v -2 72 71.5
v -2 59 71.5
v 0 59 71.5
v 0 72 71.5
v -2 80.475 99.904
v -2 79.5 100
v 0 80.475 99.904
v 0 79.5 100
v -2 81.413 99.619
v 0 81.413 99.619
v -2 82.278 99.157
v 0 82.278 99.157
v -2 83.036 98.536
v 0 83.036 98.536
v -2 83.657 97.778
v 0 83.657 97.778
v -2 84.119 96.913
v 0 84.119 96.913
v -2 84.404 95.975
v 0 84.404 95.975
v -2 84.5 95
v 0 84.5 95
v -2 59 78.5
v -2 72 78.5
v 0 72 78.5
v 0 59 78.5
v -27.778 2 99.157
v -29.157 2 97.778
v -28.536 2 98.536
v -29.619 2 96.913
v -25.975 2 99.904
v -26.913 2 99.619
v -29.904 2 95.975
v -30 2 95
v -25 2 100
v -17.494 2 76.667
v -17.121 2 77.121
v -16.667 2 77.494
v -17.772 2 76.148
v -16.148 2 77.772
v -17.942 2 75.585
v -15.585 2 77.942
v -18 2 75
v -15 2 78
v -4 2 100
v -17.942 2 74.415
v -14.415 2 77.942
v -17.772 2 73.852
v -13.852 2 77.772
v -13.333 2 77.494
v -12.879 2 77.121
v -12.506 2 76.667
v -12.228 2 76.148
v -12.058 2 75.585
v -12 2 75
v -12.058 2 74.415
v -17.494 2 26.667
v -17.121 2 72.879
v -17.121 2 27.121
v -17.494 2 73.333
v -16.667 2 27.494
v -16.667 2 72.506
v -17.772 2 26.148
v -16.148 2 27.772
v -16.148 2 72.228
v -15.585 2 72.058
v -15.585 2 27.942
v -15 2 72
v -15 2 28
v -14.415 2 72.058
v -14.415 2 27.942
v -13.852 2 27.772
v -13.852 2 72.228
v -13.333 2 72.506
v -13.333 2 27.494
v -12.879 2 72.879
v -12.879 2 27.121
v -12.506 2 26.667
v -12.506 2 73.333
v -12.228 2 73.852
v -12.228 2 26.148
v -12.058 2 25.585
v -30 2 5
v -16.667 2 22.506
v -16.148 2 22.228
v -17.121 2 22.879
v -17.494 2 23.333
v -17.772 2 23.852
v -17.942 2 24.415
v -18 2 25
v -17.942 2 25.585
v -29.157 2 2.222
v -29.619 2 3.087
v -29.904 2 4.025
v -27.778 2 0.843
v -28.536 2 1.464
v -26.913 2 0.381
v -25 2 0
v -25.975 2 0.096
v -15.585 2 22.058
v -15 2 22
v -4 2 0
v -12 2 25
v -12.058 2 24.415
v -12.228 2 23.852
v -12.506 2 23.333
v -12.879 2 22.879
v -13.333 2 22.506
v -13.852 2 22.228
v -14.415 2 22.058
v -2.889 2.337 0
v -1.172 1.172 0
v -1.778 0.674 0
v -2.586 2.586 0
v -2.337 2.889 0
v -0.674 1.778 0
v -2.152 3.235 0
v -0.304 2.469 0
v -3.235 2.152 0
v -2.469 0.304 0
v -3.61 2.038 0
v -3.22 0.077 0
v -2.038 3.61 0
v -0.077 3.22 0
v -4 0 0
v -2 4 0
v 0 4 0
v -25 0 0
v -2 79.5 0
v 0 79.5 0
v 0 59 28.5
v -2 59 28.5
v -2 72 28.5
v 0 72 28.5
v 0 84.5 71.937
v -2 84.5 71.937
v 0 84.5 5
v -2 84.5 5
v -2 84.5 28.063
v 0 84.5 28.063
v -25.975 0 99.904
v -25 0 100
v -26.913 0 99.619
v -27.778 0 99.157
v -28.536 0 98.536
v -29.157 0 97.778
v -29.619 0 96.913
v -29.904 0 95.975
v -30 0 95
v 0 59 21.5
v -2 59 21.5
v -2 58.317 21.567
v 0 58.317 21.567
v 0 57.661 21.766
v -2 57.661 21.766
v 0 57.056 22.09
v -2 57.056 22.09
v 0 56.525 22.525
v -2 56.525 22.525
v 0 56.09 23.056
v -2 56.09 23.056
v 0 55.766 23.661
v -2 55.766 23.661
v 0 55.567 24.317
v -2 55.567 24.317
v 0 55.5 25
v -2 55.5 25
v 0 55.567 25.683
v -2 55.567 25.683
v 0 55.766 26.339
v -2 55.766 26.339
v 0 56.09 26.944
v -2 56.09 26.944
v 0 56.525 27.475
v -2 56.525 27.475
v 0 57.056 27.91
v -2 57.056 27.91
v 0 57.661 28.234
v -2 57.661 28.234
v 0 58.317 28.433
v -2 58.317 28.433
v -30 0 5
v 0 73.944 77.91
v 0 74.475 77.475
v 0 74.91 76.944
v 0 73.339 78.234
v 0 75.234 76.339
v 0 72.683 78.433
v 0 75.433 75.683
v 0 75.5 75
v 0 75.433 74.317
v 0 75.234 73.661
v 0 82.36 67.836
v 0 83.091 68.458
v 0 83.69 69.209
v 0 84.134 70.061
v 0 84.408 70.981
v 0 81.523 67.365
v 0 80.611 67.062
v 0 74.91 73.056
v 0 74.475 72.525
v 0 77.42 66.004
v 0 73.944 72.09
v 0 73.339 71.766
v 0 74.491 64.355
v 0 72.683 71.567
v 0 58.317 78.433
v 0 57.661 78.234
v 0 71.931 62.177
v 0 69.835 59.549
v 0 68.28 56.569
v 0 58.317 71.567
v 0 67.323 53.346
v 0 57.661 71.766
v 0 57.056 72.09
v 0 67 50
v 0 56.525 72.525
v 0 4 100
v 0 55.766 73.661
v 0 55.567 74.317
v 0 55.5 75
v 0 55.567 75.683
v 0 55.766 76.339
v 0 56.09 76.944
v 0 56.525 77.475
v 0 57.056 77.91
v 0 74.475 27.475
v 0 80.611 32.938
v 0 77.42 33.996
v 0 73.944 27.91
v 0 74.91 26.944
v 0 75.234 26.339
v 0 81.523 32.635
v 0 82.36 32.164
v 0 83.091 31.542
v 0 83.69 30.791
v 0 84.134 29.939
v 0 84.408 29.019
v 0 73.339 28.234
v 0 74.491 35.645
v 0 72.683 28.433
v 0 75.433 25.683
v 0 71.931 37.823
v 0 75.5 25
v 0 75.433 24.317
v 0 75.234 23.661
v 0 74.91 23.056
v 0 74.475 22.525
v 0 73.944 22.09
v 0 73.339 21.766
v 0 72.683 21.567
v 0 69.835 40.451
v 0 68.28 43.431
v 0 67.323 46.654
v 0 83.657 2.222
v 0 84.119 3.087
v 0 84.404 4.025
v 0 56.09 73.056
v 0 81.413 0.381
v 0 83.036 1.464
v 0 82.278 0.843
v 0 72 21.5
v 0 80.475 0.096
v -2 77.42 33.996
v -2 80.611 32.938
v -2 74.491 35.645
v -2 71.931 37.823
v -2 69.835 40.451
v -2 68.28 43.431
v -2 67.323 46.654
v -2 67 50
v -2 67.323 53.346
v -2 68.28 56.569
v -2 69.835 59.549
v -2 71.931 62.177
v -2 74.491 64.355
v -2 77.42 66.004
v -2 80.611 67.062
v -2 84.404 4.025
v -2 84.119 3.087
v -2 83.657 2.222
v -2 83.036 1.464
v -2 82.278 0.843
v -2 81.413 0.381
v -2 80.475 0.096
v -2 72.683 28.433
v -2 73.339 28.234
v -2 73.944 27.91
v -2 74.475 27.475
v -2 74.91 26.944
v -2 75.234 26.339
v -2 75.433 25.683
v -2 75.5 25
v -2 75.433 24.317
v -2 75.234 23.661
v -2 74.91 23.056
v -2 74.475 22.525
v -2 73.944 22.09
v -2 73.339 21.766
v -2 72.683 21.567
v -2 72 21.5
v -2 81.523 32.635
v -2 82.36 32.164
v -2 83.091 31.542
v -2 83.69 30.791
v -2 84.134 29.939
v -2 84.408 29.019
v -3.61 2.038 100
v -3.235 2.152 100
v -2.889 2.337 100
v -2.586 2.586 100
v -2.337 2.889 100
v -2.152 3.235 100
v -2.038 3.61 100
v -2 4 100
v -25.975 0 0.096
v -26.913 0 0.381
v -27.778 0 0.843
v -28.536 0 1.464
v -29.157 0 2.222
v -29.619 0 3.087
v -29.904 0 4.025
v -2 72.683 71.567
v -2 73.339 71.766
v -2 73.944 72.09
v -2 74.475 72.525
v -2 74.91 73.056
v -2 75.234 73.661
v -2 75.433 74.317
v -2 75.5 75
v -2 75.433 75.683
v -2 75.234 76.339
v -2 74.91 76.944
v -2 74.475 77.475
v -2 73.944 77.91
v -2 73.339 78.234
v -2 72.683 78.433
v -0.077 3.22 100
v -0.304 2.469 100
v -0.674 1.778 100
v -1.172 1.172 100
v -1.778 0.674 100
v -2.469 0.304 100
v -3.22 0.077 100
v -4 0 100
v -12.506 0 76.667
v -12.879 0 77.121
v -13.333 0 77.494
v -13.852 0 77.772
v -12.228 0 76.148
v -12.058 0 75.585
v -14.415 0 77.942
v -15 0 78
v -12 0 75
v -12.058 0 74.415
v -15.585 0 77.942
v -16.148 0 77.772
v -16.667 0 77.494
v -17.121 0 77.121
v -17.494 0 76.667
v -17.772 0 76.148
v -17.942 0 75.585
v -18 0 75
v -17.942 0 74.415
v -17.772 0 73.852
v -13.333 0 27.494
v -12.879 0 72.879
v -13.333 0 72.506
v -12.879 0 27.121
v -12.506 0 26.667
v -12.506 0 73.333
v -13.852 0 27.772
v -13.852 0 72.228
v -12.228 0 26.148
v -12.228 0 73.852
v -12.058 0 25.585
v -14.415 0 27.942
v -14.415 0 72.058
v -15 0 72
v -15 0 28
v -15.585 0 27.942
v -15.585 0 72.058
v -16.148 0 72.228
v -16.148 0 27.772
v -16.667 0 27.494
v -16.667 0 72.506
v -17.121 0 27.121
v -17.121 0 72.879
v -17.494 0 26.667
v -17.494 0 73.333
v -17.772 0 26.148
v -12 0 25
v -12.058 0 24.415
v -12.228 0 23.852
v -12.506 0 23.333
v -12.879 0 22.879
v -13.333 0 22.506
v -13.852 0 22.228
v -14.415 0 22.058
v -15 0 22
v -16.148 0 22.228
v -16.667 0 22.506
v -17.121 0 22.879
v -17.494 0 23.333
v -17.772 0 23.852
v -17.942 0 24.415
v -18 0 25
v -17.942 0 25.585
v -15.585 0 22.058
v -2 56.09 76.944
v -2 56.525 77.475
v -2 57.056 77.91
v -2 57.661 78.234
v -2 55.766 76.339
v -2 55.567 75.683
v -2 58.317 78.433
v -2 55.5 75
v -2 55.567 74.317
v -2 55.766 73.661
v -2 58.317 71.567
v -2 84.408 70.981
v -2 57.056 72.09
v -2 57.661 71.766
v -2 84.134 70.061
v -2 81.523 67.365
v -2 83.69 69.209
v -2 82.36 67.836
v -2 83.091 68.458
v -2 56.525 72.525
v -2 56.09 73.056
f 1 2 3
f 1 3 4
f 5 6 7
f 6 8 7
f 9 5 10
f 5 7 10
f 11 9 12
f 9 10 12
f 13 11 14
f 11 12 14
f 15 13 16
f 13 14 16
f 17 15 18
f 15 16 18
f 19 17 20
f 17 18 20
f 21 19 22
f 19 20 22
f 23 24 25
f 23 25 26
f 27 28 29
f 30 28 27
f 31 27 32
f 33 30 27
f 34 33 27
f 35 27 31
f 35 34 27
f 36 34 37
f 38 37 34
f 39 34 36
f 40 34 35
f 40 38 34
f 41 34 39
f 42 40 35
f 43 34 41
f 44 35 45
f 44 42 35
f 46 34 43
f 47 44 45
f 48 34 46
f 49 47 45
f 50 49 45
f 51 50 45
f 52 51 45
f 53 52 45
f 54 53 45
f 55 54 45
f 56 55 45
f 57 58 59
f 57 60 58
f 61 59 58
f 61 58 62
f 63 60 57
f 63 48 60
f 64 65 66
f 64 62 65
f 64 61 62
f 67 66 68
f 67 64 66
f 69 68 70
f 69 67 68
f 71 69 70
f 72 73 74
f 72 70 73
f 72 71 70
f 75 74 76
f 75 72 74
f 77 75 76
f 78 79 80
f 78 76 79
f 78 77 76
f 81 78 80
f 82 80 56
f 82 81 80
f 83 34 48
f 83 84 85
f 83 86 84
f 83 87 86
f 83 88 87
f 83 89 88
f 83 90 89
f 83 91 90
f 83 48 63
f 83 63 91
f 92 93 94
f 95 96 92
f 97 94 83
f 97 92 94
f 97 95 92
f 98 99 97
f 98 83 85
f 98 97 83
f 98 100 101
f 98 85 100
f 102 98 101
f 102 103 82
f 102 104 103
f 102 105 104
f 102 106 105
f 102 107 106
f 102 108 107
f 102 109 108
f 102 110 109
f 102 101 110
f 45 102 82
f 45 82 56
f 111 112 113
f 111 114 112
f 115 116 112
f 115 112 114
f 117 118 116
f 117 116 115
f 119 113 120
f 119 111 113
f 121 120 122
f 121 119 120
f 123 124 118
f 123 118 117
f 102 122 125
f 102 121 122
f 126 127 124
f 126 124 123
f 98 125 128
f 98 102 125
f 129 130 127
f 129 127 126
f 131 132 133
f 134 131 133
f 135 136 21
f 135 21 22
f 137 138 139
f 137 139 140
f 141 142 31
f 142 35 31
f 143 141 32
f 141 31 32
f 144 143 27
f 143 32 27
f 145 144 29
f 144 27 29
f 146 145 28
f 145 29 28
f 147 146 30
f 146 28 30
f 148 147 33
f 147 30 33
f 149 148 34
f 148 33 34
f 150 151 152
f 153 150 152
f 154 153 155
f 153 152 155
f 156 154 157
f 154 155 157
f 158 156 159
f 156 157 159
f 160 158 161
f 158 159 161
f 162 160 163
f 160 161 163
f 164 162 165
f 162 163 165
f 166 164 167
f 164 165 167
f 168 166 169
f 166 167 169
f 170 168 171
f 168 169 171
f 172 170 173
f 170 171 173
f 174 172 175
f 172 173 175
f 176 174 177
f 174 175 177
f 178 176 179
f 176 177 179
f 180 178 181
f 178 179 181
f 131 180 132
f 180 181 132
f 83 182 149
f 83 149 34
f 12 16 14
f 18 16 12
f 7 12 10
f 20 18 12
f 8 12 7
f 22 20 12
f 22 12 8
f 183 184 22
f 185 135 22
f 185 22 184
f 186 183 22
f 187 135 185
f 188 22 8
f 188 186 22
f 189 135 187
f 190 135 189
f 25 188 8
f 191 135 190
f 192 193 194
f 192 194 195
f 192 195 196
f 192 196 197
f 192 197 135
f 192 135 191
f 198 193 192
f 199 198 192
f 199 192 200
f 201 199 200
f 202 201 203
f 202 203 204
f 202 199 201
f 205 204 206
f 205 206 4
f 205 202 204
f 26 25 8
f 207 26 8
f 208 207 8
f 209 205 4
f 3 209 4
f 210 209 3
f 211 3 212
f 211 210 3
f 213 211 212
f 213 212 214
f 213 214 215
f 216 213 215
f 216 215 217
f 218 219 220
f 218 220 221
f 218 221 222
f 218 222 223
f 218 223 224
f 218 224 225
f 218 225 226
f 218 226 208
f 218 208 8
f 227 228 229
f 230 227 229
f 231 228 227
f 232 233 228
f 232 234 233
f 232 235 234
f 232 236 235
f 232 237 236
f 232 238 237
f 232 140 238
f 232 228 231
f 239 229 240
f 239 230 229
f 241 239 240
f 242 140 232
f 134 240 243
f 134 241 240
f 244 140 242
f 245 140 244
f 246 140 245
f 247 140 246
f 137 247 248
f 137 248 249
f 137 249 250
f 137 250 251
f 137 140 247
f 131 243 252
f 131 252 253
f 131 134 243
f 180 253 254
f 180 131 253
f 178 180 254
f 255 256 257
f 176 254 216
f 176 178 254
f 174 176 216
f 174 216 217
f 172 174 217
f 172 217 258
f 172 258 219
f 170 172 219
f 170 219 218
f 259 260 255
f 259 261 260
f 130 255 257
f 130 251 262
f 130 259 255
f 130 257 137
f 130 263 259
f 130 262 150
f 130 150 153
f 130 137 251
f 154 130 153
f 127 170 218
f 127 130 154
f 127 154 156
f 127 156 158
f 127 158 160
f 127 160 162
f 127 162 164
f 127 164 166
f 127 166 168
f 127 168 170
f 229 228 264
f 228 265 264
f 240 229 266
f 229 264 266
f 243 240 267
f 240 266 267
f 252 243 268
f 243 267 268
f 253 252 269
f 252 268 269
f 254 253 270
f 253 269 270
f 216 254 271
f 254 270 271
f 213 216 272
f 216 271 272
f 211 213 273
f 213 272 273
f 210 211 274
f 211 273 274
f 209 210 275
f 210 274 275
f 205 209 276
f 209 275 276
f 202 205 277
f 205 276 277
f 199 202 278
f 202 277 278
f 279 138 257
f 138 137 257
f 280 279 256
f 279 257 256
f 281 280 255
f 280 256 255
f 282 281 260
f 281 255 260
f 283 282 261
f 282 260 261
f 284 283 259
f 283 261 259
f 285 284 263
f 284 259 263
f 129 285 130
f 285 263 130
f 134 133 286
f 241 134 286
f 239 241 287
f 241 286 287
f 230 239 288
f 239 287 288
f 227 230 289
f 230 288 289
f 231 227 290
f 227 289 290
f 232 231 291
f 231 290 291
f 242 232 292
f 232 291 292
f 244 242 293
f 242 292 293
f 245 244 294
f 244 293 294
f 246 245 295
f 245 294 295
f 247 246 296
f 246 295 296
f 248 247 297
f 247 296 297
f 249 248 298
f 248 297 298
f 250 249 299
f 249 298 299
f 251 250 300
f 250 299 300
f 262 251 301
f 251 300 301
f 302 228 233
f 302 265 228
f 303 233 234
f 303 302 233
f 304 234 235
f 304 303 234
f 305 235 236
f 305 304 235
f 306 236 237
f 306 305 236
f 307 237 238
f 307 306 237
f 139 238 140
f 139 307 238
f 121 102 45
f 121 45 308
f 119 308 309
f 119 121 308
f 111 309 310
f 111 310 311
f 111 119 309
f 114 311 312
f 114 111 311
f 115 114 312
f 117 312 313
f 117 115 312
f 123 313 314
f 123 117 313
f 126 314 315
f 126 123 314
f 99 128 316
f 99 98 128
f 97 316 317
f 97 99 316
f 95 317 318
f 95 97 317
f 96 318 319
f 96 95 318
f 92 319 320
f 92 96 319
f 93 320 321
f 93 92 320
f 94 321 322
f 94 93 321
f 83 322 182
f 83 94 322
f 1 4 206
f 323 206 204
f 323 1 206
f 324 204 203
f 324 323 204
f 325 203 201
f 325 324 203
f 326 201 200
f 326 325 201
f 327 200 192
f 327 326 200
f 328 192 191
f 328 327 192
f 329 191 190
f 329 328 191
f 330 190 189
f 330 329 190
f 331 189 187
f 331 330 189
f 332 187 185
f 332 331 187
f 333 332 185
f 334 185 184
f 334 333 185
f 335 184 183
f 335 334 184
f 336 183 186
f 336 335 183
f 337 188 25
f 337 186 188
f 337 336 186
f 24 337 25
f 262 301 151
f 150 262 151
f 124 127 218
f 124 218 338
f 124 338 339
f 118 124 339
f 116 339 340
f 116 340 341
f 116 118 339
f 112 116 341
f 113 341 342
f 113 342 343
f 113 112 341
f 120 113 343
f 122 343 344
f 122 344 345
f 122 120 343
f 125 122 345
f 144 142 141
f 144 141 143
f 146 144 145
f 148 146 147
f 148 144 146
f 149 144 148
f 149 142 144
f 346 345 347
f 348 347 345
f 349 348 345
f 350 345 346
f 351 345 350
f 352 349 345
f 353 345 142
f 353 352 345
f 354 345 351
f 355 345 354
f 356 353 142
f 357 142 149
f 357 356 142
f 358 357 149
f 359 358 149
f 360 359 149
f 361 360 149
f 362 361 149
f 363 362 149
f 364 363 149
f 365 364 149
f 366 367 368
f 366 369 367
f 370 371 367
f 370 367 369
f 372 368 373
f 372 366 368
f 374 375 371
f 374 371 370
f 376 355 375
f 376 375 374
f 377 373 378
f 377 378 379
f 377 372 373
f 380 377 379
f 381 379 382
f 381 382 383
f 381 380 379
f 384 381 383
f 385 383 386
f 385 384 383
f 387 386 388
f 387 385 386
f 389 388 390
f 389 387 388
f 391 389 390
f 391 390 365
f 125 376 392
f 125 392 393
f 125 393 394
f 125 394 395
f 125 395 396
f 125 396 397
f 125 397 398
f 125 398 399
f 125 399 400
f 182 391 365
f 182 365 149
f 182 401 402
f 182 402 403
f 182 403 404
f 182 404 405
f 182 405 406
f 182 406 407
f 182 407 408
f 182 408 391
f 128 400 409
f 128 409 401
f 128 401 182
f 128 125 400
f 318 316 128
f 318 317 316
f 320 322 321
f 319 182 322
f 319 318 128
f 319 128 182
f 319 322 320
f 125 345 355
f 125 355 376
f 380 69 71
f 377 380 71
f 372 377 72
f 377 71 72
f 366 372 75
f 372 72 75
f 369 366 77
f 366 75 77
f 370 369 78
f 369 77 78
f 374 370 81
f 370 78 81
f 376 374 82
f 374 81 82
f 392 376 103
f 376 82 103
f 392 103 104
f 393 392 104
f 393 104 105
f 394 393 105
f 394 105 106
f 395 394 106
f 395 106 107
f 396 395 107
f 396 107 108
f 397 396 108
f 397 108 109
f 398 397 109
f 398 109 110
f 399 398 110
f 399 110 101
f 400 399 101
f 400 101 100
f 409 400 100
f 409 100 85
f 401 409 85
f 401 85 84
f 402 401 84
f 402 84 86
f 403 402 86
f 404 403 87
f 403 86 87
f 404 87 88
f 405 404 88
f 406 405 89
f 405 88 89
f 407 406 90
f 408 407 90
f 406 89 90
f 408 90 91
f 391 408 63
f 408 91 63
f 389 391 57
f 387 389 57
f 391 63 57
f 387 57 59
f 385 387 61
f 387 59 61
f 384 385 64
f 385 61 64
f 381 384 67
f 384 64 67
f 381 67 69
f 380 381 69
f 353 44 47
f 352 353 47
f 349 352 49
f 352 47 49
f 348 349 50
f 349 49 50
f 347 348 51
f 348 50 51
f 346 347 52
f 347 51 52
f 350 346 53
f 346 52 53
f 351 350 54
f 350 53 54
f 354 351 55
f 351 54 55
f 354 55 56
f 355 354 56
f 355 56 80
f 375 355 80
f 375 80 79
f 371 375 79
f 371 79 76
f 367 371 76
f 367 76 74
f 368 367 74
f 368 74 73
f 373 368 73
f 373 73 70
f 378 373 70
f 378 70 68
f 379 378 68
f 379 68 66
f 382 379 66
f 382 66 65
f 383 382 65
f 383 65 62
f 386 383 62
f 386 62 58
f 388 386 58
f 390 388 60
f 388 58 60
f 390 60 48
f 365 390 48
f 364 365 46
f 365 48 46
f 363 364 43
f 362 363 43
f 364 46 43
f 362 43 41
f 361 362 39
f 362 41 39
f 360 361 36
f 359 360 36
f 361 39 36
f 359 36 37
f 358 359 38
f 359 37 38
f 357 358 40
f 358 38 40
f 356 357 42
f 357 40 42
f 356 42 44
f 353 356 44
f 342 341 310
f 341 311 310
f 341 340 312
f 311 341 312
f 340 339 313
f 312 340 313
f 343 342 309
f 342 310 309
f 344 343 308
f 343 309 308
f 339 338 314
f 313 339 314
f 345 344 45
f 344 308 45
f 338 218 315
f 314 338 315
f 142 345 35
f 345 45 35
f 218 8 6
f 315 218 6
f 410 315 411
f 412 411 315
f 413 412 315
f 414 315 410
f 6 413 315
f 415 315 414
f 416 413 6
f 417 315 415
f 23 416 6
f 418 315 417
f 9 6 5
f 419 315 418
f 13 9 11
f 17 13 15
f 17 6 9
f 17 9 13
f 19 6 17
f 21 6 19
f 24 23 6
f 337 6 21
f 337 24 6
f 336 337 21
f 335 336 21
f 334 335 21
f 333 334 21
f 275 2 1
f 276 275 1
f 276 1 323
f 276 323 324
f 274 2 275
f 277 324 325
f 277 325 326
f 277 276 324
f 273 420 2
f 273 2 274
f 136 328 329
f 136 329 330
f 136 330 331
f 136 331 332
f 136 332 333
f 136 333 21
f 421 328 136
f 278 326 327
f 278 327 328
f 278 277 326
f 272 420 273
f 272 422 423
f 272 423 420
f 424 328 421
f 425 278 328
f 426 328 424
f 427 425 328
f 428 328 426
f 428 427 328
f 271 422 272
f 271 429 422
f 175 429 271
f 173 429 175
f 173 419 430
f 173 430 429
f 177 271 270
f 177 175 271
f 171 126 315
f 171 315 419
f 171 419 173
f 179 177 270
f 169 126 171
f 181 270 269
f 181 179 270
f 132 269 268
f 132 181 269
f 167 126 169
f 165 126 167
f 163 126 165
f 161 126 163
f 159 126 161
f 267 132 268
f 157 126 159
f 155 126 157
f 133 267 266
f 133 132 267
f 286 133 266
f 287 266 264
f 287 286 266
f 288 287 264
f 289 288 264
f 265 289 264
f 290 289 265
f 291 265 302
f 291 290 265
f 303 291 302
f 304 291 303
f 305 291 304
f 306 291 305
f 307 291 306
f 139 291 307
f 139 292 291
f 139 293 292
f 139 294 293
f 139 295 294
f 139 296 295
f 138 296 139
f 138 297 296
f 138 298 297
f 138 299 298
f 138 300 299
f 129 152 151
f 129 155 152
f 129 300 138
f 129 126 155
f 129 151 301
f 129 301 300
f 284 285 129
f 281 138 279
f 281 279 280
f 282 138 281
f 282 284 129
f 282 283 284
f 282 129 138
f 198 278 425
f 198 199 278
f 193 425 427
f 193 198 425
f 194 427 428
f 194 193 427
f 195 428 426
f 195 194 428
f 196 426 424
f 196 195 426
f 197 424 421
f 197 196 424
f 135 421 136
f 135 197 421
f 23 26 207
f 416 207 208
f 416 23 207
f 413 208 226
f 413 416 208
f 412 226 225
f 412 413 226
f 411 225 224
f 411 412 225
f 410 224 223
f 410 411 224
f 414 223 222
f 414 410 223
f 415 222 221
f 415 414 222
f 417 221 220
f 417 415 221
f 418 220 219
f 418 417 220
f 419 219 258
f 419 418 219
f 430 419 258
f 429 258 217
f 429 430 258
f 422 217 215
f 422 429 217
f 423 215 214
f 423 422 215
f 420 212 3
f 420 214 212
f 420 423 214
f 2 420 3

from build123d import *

# Parameters (mm, degrees)
BASE_FLANGE1_DEPTH = 100
SKETCH6_R          = 17.5
CUT_EXTRUDE1_DEPTH = 10
FILLET1_R          = 5
FILLET2_R          = 5
SKETCH7_R          = 3
CUT_EXTRUDE2_DEPTH = 10
CUT_EXTRUDE3_DEPTH = 10


# Sheet-metal steps are written as plain solids
with BuildPart() as part:
    # Sketch1 → Base-Flange1 (new body)
    with BuildSketch(Plane.XY):
        with BuildLine():
            Line((0, 84.5), (0, 4))
            ThreePointArc((0, 4), (-1.171572875, 1.171572875), (-4, 0))
            Line((-4, 0), (-30, 0))
            Line((-30, 0), (-30, 2))
            Line((-30, 2), (-4, 2))
            ThreePointArc((-4, 2), (-2.585786438, 2.585786438), (-2, 4))
            Line((-2, 4), (-2, 84.5))
            Line((-2, 84.5), (0, 84.5))
        make_face()
    extrude(amount=BASE_FLANGE1_DEPTH)

    # Sketch6 → Cut-Extrude1 (cut)
    with BuildSketch(Plane.ZY.offset(2)):
        with Locations((50, 84.5)):
            Circle(SKETCH6_R)
    extrude(amount=-CUT_EXTRUDE1_DEPTH, mode=Mode.SUBTRACT)

    # Fillet1
    fillet1_edges = [part.edges().sort_by_distance(p)[0] for p in [
        (-1, 84.5, 100),
        (-1, 84.5, 32.5),
        (-1, 84.5, 67.5),
        (-1, 84.5, 0),
    ]]
    fillet(fillet1_edges, radius=FILLET1_R)

    # Fillet2
    fillet2_edges = [part.edges().sort_by_distance(p)[0] for p in [
        (-30, 1, 100),
        (-30, 1, 0),
    ]]
    fillet(fillet2_edges, radius=FILLET2_R)

    # Sketch7 → Cut-Extrude2 (cut)
    with BuildSketch(Plane(origin=(0, 2, 0), x_dir=(1, 0, 0), z_dir=(0, 1, 0))):
        with Locations(Location((-15, -25, 0), (0, 0, 270))):
            Circle(SKETCH7_R)
        with Locations(Location((-15, -75, 0), (0, 0, 270))):
            Circle(SKETCH7_R)
    extrude(amount=-CUT_EXTRUDE2_DEPTH, mode=Mode.SUBTRACT)

    # Sketch8 → Cut-Extrude3 (cut)
    with BuildSketch(Plane.ZY.offset(2)):
        with BuildLine():
            Line((21.5, 72), (21.5, 59))
            ThreePointArc((21.5, 59), (25, 55.5), (28.5, 59))
            Line((28.5, 59), (28.5, 72))
            ThreePointArc((28.5, 72), (25, 75.5), (21.5, 72))
        make_face()
        with BuildLine():
            Line((78.5, 72), (78.5, 59))
            ThreePointArc((78.5, 59), (75, 55.5), (71.5, 59))
            Line((71.5, 59), (71.5, 72))
            ThreePointArc((71.5, 72), (75, 75.5), (78.5, 72))
        make_face()
    extrude(amount=-CUT_EXTRUDE3_DEPTH, mode=Mode.SUBTRACT)


solid = part.part
